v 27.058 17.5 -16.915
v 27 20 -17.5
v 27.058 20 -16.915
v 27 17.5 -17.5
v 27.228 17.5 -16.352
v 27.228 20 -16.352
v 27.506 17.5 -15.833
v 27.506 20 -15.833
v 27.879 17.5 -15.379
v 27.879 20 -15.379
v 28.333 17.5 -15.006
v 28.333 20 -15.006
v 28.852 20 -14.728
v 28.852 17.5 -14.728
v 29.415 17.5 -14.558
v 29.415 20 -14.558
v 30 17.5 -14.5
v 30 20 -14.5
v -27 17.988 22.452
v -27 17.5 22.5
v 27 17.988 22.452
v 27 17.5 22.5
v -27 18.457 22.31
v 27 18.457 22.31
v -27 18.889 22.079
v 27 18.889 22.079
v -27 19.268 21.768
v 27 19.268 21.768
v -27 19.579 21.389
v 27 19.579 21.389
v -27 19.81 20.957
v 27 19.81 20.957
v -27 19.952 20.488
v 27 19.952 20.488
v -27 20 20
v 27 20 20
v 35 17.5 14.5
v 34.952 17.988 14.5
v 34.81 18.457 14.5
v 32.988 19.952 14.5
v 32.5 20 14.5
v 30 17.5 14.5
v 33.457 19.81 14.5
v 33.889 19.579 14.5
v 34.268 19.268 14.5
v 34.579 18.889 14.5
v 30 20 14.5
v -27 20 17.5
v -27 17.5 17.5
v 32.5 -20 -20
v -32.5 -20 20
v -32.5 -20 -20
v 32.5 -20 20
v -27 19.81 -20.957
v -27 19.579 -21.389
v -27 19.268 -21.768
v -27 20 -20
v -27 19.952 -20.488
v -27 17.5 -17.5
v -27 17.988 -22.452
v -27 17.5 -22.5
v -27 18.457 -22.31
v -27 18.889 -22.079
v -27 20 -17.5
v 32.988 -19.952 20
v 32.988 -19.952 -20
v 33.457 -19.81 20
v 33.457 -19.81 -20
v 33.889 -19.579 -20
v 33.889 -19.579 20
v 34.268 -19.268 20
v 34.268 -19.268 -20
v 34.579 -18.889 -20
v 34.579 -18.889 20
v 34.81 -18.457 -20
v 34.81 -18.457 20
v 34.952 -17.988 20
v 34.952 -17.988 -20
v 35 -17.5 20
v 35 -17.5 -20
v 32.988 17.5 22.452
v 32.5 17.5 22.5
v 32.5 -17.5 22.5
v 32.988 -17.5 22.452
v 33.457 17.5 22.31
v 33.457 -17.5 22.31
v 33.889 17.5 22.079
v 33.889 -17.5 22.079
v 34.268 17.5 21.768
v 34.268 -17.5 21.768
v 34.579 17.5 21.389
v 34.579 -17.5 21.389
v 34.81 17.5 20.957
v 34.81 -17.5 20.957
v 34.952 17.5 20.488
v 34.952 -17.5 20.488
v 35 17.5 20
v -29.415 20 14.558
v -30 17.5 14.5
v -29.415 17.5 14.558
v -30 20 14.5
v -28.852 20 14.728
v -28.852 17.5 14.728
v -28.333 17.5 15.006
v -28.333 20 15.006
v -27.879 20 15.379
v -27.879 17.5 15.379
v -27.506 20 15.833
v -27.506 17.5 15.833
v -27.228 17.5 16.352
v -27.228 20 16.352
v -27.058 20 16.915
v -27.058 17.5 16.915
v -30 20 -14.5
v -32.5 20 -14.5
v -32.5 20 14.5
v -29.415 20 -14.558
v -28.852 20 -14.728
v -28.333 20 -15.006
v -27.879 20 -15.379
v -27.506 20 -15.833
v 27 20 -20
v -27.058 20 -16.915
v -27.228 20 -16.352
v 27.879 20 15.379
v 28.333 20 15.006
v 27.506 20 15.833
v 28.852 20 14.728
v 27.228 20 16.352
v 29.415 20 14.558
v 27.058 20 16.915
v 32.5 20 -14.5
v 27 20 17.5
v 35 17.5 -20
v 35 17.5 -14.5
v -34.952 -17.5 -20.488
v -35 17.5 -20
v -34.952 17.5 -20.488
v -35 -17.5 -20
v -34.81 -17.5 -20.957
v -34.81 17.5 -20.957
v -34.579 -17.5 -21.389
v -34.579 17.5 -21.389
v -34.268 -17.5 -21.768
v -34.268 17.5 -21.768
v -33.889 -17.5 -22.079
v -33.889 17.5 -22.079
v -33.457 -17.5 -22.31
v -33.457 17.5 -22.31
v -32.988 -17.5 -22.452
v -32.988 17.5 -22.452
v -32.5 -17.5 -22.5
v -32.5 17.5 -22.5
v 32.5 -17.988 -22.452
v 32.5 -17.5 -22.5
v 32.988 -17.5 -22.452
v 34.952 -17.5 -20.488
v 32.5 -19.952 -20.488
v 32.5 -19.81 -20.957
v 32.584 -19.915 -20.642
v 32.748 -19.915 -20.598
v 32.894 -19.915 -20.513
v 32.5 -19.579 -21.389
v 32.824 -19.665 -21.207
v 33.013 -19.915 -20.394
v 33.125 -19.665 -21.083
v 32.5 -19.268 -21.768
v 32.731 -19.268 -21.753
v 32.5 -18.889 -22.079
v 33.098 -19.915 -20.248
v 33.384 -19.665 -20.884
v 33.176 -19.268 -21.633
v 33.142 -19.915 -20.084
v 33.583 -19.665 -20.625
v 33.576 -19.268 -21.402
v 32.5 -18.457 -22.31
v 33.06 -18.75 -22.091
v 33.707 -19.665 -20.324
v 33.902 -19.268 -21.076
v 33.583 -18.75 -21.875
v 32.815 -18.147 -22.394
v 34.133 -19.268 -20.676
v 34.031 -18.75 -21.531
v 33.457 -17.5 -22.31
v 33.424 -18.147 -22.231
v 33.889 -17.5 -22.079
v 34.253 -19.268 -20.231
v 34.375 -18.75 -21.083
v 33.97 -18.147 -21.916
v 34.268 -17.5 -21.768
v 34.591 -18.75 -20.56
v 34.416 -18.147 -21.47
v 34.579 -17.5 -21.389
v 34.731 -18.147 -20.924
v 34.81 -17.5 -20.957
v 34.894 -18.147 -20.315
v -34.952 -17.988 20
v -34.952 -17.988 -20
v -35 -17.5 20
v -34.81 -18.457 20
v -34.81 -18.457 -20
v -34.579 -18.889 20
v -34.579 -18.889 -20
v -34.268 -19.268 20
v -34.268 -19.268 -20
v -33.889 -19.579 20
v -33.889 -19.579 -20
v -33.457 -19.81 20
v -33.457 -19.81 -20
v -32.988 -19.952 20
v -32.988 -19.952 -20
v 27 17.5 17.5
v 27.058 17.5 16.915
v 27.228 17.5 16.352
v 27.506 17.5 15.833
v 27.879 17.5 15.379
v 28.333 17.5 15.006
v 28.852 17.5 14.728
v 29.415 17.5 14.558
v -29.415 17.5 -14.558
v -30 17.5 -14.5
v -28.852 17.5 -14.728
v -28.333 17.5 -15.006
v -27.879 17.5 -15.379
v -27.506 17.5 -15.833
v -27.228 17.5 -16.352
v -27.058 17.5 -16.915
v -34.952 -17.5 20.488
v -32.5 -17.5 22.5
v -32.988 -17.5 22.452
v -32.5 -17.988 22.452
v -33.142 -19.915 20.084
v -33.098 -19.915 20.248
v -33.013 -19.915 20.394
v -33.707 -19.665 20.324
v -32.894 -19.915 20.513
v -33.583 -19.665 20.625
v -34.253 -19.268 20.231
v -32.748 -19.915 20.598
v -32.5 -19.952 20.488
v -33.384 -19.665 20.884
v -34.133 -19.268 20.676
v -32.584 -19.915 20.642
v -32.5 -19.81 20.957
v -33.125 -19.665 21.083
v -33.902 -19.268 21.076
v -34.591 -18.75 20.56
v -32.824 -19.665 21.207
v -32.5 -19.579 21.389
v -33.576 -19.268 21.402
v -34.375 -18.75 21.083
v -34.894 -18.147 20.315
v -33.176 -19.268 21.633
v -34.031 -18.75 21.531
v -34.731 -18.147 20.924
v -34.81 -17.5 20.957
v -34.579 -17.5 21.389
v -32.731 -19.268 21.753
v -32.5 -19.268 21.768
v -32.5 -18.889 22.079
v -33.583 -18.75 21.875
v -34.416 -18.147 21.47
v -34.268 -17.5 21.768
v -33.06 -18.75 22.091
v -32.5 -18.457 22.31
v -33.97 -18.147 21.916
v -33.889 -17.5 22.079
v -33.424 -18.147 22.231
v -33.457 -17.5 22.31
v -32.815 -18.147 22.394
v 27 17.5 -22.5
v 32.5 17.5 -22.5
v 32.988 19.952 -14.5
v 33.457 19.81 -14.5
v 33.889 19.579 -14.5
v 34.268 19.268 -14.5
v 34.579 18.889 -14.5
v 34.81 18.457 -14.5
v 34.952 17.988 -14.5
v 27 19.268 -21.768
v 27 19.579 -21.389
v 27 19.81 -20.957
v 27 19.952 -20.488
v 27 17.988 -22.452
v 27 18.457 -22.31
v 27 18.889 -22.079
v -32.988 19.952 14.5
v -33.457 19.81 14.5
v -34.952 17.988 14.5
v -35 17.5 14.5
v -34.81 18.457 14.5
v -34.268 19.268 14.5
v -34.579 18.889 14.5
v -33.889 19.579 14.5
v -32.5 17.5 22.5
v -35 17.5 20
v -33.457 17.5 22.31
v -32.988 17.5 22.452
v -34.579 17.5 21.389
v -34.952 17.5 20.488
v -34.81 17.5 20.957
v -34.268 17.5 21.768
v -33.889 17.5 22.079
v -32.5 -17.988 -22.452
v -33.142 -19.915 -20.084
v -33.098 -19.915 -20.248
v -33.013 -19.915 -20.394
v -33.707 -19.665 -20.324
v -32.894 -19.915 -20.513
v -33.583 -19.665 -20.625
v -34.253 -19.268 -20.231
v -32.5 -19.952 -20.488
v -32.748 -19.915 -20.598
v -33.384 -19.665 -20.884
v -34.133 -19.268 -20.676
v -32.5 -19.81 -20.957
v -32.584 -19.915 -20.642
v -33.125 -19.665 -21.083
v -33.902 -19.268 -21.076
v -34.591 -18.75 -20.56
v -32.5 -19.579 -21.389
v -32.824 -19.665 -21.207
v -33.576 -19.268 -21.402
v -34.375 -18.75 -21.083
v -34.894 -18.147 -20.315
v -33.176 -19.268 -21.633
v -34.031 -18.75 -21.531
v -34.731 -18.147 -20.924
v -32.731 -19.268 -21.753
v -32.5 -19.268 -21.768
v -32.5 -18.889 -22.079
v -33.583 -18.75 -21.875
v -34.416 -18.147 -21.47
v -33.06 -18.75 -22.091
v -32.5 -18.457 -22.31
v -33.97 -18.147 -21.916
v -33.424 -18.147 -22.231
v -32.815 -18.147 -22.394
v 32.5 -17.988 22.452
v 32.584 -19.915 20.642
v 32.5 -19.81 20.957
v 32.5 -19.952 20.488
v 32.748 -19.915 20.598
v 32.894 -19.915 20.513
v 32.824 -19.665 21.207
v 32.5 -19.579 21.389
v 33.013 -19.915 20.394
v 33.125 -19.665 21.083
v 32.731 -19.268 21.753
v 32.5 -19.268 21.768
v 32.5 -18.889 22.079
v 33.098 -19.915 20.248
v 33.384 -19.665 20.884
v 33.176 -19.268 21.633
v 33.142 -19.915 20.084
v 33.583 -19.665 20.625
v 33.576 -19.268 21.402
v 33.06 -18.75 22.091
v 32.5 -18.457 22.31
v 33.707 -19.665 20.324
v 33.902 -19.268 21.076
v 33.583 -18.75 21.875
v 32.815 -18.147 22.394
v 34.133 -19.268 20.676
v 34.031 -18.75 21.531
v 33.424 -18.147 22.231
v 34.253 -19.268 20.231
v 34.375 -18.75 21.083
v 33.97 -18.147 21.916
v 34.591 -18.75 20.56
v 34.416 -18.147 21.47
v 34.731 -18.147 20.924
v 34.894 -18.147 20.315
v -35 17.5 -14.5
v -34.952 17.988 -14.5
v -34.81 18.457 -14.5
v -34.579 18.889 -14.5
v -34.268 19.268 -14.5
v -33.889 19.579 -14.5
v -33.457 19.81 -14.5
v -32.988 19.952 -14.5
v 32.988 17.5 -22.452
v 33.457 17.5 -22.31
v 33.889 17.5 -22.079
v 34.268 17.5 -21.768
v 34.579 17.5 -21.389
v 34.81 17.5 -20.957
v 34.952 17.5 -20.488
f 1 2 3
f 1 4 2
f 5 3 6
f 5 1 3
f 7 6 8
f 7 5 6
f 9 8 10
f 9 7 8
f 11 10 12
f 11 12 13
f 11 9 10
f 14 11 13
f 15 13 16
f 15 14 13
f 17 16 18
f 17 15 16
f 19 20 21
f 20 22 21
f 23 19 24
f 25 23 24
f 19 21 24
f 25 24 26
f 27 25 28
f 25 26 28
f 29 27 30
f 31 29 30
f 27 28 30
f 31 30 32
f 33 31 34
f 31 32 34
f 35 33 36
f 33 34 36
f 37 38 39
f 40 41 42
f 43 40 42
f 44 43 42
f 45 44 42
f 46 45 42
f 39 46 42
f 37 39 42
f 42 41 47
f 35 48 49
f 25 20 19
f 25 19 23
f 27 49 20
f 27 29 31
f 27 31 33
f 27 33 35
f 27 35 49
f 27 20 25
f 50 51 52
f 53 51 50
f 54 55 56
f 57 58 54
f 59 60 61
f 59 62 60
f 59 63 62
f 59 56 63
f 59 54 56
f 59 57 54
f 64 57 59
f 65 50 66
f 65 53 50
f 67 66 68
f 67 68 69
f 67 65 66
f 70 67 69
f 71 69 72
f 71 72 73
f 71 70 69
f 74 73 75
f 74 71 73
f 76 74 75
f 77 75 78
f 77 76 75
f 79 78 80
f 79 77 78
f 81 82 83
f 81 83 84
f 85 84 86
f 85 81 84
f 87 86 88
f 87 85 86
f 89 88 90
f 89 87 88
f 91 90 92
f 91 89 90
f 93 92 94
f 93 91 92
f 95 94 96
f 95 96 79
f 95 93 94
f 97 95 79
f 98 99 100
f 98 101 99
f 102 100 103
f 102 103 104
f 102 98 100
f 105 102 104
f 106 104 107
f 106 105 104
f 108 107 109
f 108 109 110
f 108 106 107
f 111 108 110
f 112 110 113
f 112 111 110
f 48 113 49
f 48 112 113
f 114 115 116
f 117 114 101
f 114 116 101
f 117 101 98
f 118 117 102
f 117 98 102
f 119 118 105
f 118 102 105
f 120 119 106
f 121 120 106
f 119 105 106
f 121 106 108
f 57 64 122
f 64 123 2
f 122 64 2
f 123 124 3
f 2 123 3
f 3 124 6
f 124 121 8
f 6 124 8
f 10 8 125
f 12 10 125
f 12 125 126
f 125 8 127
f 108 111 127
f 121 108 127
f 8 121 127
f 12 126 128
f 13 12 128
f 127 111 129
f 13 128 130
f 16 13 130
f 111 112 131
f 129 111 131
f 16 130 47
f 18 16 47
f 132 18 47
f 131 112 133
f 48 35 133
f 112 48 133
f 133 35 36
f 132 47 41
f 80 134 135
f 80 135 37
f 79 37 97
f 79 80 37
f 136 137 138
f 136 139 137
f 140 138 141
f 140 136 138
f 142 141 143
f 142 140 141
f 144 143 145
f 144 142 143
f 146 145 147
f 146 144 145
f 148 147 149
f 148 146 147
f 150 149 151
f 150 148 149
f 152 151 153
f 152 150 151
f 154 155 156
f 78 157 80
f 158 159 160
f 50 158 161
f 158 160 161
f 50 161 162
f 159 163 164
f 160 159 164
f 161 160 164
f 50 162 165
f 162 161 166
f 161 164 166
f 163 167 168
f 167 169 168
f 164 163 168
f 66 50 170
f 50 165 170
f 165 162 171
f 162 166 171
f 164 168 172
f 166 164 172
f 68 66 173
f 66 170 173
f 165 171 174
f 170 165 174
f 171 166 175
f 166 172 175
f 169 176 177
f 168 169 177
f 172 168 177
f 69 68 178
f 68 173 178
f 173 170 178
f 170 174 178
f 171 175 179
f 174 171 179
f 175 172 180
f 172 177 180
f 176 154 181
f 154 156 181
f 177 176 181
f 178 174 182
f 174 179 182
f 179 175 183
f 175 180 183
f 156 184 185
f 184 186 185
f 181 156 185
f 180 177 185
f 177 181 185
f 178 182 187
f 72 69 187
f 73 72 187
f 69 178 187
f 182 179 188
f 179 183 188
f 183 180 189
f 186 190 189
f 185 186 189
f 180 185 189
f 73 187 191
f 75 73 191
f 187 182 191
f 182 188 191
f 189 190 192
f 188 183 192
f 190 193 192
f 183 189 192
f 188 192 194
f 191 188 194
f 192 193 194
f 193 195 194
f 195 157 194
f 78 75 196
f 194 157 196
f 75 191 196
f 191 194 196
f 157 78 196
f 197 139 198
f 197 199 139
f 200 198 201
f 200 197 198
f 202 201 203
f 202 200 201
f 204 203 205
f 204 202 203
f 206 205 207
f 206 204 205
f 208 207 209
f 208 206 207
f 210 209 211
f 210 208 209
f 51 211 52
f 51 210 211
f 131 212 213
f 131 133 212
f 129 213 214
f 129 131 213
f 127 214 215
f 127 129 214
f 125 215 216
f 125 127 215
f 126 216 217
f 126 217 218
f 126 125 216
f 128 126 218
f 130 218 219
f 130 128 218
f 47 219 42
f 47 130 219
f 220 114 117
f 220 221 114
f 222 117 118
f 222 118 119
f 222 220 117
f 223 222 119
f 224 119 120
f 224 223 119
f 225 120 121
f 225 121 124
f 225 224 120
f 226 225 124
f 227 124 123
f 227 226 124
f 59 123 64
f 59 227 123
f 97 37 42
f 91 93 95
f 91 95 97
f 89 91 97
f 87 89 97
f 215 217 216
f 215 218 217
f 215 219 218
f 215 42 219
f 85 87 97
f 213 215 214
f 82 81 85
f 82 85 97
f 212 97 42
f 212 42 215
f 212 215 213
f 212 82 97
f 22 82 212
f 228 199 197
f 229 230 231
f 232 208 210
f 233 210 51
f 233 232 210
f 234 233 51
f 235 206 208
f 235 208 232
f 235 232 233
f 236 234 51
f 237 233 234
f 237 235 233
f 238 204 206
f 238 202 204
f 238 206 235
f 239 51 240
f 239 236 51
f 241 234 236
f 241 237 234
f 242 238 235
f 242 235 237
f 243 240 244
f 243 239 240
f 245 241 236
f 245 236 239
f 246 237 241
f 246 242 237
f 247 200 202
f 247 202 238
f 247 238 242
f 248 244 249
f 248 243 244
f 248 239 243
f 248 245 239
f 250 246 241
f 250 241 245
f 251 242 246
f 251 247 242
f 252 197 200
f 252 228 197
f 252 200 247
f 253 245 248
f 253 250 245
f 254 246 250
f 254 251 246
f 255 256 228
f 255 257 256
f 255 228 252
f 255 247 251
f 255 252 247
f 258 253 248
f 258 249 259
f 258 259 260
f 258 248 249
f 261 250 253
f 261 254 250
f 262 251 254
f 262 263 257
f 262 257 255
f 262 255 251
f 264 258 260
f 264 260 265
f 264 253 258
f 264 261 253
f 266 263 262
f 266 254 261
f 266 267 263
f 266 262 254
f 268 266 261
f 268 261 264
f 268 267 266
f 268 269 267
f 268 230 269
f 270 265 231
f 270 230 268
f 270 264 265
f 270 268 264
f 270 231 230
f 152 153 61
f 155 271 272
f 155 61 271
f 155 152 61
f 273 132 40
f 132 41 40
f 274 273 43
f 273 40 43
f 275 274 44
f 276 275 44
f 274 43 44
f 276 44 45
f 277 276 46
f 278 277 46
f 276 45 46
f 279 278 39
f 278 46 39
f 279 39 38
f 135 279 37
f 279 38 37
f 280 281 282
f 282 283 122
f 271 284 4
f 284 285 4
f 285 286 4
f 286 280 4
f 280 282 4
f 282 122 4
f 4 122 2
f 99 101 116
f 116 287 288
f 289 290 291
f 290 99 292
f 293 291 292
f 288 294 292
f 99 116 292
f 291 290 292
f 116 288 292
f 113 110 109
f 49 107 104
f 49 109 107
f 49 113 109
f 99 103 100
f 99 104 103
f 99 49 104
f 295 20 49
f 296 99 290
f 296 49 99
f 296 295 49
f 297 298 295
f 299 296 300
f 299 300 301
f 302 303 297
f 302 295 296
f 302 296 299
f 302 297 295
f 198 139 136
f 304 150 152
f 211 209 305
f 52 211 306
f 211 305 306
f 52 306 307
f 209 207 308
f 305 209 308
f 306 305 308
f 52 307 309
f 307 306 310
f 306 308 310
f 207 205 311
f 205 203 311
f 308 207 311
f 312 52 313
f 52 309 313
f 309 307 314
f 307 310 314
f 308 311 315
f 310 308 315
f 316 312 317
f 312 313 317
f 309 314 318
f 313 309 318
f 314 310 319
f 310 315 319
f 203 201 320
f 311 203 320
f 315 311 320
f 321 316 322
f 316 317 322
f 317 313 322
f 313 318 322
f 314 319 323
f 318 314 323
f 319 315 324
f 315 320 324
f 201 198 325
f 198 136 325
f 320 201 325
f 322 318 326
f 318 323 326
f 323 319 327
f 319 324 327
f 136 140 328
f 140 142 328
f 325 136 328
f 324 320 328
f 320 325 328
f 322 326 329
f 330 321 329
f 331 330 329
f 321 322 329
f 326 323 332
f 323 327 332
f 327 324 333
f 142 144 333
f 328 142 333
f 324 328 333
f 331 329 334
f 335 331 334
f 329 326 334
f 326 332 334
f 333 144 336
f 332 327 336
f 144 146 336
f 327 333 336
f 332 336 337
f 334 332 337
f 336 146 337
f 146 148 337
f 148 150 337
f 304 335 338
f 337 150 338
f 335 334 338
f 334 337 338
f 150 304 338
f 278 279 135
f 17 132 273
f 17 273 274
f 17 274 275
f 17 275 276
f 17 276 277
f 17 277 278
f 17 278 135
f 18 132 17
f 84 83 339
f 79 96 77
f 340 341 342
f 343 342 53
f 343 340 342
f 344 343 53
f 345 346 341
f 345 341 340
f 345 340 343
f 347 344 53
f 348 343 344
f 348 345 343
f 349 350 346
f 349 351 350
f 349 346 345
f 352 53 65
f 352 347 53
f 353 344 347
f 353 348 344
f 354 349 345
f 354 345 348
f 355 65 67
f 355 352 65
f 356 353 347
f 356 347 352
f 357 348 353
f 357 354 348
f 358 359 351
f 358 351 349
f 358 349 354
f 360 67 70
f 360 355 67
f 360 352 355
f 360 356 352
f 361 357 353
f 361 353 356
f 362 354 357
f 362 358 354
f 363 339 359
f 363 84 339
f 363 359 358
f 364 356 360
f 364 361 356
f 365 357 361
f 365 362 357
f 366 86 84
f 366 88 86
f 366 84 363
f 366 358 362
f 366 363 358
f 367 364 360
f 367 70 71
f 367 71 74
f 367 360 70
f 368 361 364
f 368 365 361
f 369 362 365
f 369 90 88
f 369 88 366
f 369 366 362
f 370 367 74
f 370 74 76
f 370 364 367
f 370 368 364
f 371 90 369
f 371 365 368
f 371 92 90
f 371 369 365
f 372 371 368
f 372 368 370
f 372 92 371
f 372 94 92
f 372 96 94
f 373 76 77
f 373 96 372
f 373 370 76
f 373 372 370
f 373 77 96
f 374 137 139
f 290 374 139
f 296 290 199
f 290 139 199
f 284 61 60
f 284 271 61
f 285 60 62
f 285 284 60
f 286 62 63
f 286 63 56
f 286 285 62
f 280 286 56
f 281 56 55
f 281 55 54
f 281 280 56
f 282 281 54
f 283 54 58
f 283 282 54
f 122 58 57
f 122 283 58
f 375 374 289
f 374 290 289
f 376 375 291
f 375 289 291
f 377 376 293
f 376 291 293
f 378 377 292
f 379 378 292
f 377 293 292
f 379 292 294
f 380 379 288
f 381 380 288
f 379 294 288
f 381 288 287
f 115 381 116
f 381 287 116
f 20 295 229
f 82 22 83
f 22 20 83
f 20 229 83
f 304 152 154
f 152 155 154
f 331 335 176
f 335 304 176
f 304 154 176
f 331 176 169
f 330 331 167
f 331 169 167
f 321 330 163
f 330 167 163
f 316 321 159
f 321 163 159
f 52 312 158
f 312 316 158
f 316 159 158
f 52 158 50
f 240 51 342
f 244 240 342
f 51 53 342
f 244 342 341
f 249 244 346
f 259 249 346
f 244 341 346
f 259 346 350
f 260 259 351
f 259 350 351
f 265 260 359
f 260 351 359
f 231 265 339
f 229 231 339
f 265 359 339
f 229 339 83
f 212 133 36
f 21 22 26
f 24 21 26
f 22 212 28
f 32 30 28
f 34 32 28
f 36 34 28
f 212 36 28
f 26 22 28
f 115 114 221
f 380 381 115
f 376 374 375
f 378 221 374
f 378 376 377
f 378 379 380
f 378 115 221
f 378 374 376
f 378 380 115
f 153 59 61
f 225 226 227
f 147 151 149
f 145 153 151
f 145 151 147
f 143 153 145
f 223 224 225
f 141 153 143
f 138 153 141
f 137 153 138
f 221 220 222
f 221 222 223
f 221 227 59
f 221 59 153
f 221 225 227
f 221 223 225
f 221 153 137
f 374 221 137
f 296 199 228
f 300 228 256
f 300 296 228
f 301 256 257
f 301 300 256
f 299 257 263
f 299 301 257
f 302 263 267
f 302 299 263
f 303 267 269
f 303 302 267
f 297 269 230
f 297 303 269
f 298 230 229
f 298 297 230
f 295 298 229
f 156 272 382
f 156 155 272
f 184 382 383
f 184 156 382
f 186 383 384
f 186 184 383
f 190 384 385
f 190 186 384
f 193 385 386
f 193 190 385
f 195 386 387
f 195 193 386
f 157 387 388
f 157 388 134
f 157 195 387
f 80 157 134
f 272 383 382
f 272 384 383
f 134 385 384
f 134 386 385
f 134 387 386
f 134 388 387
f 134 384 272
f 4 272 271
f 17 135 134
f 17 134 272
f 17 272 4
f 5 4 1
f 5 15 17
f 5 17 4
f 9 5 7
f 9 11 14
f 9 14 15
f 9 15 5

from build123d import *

# Parameters (mm, degrees)
F0_W     = 70
F0_H     = 45
F1_DEPTH = 20
F2_W     = 8
F2_H     = 8
F3_DEPTH = 2.5
F4_W     = 8
F4_H     = 8
F5_DEPTH = 2.5
F6_W     = 8
F6_H     = 8
F7_DEPTH = 2.5
F8_W     = 8
F8_H     = 8
F9_DEPTH = 2.5
F10_R    = 2.5
F11_R    = 3


with BuildPart() as f1:
    # F0 (on Front) → F1 (new body, symmetric)
    with BuildSketch(Plane.XZ):
        Rectangle(F0_W, F0_H)
    extrude(amount=F1_DEPTH, both=True)

    # F2 (on face) → F3 (cut, symmetric)
    with BuildSketch(Plane(origin=(0, 20, 0), x_dir=(-1, 0, 0), z_dir=(0, 1, 0))):
        with Locations((-31, -18.5)):
            Rectangle(F2_W, F2_H)
    extrude(amount=F3_DEPTH, both=True, mode=Mode.SUBTRACT)

    # F4 (on face) → F5 (cut, symmetric)
    with BuildSketch(Plane(origin=(0, 20, 0), x_dir=(-1, 0, 0), z_dir=(0, 1, 0))):
        with Locations((31, -18.5)):
            Rectangle(F4_W, F4_H)
    extrude(amount=F5_DEPTH, both=True, mode=Mode.SUBTRACT)

    # F6 (on face) → F7 (cut, symmetric)
    with BuildSketch(Plane(origin=(0, 20, 0), x_dir=(-1, 0, 0), z_dir=(0, 1, 0))):
        with Locations((-31, 18.5)):
            Rectangle(F6_W, F6_H)
    extrude(amount=F7_DEPTH, both=True, mode=Mode.SUBTRACT)

    # F8 (on face) → F9 (cut, symmetric)
    with BuildSketch(Plane(origin=(0, 20, 0), x_dir=(-1, 0, 0), z_dir=(0, 1, 0))):
        with Locations((31, 18.5)):
            Rectangle(F8_W, F8_H)
    extrude(amount=F9_DEPTH, both=True, mode=Mode.SUBTRACT)

    # F10
    f10_edges = [f1.edges().sort_by_distance(p)[0] for p in [
        (35, -1.25, -22.5),
        (35, -1.25, 22.5),
        (-35, -1.25, 22.5),
        (-35, -1.25, -22.5),
        (-35, -20, 0),
        (-35, 20, 0),
        (0, 20, 22.5),
        (35, 20, 0),
        (0, 20, -22.5),
        (0, -20, 22.5),
        (0, -20, -22.5),
        (35, -20, 0),
    ]]
    fillet(f10_edges, radius=F10_R)

    # F11
    f11_edges = [f1.edges().sort_by_distance(p)[0] for p in [
        (27, 18.75, 14.5),
        (27, 18.75, -14.5),
        (-27, 18.75, -14.5),
        (-27, 18.75, 14.5),
    ]]
    fillet(f11_edges, radius=F11_R)


solid = f1.part
